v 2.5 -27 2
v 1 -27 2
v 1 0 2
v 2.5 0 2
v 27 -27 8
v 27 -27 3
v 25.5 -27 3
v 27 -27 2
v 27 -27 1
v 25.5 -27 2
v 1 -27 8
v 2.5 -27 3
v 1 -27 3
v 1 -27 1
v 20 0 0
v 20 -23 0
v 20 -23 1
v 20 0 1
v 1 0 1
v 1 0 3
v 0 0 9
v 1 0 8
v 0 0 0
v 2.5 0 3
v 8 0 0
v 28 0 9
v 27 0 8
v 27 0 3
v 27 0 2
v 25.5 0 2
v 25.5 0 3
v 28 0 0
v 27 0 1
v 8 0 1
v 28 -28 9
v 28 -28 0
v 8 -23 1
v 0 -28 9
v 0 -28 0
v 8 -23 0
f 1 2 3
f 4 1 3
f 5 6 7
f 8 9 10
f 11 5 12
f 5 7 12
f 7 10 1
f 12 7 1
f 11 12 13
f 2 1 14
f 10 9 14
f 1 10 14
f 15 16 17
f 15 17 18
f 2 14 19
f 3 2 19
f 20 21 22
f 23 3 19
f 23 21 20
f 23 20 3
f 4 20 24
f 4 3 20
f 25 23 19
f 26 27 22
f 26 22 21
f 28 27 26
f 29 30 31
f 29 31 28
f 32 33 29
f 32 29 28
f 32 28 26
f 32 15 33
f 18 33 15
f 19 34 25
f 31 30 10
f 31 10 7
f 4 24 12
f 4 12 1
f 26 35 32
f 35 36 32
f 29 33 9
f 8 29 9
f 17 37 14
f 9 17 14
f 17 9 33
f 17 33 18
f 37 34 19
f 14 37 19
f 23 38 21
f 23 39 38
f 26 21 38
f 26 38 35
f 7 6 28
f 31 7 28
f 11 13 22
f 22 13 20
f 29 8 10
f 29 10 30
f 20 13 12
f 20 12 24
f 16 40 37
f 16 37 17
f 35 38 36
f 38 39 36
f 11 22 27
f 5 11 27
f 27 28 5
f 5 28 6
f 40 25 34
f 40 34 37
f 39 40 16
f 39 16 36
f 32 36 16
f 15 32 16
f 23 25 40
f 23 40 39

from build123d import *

# Parameters (mm, degrees)
EXTRUDE_1_DEPTH = 1
EXTRUDE_2_DEPTH = 7
SKETCH_5_W      = 1
SKETCH_5_H      = 27
EXTRUDE_3_DEPTH = 1.5
SKETCH_7_W      = 1
SKETCH_7_H      = 27
EXTRUDE_4_DEPTH = 1.5
SKETCH_8_W      = 28
SKETCH_8_H      = 28
EXTRUDE_5_DEPTH = 1


with BuildPart() as part:
    # 스케치1 → 보스-돌출1 (new body)
    with BuildSketch(Plane.XY):
        Polygon((20, 0), (28, 0), (28, -28), (0, -28), (0, 0), (8, 0), (8, -23), (20, -23), align=None)
    extrude(amount=EXTRUDE_1_DEPTH)

    # 스케치3 → 보스-돌출2 (add)
    with BuildSketch(Plane.XY.offset(1)):
        Polygon((1, 0), (0, 0), (0, -28), (28, -28), (28, 0), (27, 0), (27, -27), (1, -27), align=None)
    extrude(amount=EXTRUDE_2_DEPTH)

    # 스케치5 → 보스-돌출3 (add)
    with BuildSketch(Plane(origin=(1, 0, 0), x_dir=(0, 0, -1), z_dir=(1, 0, 0))):
        with Locations((-2.5, -13.5)):
            Rectangle(SKETCH_5_W, SKETCH_5_H)
    extrude(amount=EXTRUDE_3_DEPTH)

    # 스케치7 → 보스-돌출4 (add)
    with BuildSketch(Plane.ZY.offset(-27)):
        with Locations((2.5, -13.5)):
            Rectangle(SKETCH_7_W, SKETCH_7_H)
    extrude(amount=EXTRUDE_4_DEPTH)

    # 스케치8 → 보스-돌출5 (add)
    with BuildSketch(Plane.XY.offset(8)):
        with Locations((14, -14)):
            Rectangle(SKETCH_8_W, SKETCH_8_H)
    extrude(amount=EXTRUDE_5_DEPTH)


solid = part.part
